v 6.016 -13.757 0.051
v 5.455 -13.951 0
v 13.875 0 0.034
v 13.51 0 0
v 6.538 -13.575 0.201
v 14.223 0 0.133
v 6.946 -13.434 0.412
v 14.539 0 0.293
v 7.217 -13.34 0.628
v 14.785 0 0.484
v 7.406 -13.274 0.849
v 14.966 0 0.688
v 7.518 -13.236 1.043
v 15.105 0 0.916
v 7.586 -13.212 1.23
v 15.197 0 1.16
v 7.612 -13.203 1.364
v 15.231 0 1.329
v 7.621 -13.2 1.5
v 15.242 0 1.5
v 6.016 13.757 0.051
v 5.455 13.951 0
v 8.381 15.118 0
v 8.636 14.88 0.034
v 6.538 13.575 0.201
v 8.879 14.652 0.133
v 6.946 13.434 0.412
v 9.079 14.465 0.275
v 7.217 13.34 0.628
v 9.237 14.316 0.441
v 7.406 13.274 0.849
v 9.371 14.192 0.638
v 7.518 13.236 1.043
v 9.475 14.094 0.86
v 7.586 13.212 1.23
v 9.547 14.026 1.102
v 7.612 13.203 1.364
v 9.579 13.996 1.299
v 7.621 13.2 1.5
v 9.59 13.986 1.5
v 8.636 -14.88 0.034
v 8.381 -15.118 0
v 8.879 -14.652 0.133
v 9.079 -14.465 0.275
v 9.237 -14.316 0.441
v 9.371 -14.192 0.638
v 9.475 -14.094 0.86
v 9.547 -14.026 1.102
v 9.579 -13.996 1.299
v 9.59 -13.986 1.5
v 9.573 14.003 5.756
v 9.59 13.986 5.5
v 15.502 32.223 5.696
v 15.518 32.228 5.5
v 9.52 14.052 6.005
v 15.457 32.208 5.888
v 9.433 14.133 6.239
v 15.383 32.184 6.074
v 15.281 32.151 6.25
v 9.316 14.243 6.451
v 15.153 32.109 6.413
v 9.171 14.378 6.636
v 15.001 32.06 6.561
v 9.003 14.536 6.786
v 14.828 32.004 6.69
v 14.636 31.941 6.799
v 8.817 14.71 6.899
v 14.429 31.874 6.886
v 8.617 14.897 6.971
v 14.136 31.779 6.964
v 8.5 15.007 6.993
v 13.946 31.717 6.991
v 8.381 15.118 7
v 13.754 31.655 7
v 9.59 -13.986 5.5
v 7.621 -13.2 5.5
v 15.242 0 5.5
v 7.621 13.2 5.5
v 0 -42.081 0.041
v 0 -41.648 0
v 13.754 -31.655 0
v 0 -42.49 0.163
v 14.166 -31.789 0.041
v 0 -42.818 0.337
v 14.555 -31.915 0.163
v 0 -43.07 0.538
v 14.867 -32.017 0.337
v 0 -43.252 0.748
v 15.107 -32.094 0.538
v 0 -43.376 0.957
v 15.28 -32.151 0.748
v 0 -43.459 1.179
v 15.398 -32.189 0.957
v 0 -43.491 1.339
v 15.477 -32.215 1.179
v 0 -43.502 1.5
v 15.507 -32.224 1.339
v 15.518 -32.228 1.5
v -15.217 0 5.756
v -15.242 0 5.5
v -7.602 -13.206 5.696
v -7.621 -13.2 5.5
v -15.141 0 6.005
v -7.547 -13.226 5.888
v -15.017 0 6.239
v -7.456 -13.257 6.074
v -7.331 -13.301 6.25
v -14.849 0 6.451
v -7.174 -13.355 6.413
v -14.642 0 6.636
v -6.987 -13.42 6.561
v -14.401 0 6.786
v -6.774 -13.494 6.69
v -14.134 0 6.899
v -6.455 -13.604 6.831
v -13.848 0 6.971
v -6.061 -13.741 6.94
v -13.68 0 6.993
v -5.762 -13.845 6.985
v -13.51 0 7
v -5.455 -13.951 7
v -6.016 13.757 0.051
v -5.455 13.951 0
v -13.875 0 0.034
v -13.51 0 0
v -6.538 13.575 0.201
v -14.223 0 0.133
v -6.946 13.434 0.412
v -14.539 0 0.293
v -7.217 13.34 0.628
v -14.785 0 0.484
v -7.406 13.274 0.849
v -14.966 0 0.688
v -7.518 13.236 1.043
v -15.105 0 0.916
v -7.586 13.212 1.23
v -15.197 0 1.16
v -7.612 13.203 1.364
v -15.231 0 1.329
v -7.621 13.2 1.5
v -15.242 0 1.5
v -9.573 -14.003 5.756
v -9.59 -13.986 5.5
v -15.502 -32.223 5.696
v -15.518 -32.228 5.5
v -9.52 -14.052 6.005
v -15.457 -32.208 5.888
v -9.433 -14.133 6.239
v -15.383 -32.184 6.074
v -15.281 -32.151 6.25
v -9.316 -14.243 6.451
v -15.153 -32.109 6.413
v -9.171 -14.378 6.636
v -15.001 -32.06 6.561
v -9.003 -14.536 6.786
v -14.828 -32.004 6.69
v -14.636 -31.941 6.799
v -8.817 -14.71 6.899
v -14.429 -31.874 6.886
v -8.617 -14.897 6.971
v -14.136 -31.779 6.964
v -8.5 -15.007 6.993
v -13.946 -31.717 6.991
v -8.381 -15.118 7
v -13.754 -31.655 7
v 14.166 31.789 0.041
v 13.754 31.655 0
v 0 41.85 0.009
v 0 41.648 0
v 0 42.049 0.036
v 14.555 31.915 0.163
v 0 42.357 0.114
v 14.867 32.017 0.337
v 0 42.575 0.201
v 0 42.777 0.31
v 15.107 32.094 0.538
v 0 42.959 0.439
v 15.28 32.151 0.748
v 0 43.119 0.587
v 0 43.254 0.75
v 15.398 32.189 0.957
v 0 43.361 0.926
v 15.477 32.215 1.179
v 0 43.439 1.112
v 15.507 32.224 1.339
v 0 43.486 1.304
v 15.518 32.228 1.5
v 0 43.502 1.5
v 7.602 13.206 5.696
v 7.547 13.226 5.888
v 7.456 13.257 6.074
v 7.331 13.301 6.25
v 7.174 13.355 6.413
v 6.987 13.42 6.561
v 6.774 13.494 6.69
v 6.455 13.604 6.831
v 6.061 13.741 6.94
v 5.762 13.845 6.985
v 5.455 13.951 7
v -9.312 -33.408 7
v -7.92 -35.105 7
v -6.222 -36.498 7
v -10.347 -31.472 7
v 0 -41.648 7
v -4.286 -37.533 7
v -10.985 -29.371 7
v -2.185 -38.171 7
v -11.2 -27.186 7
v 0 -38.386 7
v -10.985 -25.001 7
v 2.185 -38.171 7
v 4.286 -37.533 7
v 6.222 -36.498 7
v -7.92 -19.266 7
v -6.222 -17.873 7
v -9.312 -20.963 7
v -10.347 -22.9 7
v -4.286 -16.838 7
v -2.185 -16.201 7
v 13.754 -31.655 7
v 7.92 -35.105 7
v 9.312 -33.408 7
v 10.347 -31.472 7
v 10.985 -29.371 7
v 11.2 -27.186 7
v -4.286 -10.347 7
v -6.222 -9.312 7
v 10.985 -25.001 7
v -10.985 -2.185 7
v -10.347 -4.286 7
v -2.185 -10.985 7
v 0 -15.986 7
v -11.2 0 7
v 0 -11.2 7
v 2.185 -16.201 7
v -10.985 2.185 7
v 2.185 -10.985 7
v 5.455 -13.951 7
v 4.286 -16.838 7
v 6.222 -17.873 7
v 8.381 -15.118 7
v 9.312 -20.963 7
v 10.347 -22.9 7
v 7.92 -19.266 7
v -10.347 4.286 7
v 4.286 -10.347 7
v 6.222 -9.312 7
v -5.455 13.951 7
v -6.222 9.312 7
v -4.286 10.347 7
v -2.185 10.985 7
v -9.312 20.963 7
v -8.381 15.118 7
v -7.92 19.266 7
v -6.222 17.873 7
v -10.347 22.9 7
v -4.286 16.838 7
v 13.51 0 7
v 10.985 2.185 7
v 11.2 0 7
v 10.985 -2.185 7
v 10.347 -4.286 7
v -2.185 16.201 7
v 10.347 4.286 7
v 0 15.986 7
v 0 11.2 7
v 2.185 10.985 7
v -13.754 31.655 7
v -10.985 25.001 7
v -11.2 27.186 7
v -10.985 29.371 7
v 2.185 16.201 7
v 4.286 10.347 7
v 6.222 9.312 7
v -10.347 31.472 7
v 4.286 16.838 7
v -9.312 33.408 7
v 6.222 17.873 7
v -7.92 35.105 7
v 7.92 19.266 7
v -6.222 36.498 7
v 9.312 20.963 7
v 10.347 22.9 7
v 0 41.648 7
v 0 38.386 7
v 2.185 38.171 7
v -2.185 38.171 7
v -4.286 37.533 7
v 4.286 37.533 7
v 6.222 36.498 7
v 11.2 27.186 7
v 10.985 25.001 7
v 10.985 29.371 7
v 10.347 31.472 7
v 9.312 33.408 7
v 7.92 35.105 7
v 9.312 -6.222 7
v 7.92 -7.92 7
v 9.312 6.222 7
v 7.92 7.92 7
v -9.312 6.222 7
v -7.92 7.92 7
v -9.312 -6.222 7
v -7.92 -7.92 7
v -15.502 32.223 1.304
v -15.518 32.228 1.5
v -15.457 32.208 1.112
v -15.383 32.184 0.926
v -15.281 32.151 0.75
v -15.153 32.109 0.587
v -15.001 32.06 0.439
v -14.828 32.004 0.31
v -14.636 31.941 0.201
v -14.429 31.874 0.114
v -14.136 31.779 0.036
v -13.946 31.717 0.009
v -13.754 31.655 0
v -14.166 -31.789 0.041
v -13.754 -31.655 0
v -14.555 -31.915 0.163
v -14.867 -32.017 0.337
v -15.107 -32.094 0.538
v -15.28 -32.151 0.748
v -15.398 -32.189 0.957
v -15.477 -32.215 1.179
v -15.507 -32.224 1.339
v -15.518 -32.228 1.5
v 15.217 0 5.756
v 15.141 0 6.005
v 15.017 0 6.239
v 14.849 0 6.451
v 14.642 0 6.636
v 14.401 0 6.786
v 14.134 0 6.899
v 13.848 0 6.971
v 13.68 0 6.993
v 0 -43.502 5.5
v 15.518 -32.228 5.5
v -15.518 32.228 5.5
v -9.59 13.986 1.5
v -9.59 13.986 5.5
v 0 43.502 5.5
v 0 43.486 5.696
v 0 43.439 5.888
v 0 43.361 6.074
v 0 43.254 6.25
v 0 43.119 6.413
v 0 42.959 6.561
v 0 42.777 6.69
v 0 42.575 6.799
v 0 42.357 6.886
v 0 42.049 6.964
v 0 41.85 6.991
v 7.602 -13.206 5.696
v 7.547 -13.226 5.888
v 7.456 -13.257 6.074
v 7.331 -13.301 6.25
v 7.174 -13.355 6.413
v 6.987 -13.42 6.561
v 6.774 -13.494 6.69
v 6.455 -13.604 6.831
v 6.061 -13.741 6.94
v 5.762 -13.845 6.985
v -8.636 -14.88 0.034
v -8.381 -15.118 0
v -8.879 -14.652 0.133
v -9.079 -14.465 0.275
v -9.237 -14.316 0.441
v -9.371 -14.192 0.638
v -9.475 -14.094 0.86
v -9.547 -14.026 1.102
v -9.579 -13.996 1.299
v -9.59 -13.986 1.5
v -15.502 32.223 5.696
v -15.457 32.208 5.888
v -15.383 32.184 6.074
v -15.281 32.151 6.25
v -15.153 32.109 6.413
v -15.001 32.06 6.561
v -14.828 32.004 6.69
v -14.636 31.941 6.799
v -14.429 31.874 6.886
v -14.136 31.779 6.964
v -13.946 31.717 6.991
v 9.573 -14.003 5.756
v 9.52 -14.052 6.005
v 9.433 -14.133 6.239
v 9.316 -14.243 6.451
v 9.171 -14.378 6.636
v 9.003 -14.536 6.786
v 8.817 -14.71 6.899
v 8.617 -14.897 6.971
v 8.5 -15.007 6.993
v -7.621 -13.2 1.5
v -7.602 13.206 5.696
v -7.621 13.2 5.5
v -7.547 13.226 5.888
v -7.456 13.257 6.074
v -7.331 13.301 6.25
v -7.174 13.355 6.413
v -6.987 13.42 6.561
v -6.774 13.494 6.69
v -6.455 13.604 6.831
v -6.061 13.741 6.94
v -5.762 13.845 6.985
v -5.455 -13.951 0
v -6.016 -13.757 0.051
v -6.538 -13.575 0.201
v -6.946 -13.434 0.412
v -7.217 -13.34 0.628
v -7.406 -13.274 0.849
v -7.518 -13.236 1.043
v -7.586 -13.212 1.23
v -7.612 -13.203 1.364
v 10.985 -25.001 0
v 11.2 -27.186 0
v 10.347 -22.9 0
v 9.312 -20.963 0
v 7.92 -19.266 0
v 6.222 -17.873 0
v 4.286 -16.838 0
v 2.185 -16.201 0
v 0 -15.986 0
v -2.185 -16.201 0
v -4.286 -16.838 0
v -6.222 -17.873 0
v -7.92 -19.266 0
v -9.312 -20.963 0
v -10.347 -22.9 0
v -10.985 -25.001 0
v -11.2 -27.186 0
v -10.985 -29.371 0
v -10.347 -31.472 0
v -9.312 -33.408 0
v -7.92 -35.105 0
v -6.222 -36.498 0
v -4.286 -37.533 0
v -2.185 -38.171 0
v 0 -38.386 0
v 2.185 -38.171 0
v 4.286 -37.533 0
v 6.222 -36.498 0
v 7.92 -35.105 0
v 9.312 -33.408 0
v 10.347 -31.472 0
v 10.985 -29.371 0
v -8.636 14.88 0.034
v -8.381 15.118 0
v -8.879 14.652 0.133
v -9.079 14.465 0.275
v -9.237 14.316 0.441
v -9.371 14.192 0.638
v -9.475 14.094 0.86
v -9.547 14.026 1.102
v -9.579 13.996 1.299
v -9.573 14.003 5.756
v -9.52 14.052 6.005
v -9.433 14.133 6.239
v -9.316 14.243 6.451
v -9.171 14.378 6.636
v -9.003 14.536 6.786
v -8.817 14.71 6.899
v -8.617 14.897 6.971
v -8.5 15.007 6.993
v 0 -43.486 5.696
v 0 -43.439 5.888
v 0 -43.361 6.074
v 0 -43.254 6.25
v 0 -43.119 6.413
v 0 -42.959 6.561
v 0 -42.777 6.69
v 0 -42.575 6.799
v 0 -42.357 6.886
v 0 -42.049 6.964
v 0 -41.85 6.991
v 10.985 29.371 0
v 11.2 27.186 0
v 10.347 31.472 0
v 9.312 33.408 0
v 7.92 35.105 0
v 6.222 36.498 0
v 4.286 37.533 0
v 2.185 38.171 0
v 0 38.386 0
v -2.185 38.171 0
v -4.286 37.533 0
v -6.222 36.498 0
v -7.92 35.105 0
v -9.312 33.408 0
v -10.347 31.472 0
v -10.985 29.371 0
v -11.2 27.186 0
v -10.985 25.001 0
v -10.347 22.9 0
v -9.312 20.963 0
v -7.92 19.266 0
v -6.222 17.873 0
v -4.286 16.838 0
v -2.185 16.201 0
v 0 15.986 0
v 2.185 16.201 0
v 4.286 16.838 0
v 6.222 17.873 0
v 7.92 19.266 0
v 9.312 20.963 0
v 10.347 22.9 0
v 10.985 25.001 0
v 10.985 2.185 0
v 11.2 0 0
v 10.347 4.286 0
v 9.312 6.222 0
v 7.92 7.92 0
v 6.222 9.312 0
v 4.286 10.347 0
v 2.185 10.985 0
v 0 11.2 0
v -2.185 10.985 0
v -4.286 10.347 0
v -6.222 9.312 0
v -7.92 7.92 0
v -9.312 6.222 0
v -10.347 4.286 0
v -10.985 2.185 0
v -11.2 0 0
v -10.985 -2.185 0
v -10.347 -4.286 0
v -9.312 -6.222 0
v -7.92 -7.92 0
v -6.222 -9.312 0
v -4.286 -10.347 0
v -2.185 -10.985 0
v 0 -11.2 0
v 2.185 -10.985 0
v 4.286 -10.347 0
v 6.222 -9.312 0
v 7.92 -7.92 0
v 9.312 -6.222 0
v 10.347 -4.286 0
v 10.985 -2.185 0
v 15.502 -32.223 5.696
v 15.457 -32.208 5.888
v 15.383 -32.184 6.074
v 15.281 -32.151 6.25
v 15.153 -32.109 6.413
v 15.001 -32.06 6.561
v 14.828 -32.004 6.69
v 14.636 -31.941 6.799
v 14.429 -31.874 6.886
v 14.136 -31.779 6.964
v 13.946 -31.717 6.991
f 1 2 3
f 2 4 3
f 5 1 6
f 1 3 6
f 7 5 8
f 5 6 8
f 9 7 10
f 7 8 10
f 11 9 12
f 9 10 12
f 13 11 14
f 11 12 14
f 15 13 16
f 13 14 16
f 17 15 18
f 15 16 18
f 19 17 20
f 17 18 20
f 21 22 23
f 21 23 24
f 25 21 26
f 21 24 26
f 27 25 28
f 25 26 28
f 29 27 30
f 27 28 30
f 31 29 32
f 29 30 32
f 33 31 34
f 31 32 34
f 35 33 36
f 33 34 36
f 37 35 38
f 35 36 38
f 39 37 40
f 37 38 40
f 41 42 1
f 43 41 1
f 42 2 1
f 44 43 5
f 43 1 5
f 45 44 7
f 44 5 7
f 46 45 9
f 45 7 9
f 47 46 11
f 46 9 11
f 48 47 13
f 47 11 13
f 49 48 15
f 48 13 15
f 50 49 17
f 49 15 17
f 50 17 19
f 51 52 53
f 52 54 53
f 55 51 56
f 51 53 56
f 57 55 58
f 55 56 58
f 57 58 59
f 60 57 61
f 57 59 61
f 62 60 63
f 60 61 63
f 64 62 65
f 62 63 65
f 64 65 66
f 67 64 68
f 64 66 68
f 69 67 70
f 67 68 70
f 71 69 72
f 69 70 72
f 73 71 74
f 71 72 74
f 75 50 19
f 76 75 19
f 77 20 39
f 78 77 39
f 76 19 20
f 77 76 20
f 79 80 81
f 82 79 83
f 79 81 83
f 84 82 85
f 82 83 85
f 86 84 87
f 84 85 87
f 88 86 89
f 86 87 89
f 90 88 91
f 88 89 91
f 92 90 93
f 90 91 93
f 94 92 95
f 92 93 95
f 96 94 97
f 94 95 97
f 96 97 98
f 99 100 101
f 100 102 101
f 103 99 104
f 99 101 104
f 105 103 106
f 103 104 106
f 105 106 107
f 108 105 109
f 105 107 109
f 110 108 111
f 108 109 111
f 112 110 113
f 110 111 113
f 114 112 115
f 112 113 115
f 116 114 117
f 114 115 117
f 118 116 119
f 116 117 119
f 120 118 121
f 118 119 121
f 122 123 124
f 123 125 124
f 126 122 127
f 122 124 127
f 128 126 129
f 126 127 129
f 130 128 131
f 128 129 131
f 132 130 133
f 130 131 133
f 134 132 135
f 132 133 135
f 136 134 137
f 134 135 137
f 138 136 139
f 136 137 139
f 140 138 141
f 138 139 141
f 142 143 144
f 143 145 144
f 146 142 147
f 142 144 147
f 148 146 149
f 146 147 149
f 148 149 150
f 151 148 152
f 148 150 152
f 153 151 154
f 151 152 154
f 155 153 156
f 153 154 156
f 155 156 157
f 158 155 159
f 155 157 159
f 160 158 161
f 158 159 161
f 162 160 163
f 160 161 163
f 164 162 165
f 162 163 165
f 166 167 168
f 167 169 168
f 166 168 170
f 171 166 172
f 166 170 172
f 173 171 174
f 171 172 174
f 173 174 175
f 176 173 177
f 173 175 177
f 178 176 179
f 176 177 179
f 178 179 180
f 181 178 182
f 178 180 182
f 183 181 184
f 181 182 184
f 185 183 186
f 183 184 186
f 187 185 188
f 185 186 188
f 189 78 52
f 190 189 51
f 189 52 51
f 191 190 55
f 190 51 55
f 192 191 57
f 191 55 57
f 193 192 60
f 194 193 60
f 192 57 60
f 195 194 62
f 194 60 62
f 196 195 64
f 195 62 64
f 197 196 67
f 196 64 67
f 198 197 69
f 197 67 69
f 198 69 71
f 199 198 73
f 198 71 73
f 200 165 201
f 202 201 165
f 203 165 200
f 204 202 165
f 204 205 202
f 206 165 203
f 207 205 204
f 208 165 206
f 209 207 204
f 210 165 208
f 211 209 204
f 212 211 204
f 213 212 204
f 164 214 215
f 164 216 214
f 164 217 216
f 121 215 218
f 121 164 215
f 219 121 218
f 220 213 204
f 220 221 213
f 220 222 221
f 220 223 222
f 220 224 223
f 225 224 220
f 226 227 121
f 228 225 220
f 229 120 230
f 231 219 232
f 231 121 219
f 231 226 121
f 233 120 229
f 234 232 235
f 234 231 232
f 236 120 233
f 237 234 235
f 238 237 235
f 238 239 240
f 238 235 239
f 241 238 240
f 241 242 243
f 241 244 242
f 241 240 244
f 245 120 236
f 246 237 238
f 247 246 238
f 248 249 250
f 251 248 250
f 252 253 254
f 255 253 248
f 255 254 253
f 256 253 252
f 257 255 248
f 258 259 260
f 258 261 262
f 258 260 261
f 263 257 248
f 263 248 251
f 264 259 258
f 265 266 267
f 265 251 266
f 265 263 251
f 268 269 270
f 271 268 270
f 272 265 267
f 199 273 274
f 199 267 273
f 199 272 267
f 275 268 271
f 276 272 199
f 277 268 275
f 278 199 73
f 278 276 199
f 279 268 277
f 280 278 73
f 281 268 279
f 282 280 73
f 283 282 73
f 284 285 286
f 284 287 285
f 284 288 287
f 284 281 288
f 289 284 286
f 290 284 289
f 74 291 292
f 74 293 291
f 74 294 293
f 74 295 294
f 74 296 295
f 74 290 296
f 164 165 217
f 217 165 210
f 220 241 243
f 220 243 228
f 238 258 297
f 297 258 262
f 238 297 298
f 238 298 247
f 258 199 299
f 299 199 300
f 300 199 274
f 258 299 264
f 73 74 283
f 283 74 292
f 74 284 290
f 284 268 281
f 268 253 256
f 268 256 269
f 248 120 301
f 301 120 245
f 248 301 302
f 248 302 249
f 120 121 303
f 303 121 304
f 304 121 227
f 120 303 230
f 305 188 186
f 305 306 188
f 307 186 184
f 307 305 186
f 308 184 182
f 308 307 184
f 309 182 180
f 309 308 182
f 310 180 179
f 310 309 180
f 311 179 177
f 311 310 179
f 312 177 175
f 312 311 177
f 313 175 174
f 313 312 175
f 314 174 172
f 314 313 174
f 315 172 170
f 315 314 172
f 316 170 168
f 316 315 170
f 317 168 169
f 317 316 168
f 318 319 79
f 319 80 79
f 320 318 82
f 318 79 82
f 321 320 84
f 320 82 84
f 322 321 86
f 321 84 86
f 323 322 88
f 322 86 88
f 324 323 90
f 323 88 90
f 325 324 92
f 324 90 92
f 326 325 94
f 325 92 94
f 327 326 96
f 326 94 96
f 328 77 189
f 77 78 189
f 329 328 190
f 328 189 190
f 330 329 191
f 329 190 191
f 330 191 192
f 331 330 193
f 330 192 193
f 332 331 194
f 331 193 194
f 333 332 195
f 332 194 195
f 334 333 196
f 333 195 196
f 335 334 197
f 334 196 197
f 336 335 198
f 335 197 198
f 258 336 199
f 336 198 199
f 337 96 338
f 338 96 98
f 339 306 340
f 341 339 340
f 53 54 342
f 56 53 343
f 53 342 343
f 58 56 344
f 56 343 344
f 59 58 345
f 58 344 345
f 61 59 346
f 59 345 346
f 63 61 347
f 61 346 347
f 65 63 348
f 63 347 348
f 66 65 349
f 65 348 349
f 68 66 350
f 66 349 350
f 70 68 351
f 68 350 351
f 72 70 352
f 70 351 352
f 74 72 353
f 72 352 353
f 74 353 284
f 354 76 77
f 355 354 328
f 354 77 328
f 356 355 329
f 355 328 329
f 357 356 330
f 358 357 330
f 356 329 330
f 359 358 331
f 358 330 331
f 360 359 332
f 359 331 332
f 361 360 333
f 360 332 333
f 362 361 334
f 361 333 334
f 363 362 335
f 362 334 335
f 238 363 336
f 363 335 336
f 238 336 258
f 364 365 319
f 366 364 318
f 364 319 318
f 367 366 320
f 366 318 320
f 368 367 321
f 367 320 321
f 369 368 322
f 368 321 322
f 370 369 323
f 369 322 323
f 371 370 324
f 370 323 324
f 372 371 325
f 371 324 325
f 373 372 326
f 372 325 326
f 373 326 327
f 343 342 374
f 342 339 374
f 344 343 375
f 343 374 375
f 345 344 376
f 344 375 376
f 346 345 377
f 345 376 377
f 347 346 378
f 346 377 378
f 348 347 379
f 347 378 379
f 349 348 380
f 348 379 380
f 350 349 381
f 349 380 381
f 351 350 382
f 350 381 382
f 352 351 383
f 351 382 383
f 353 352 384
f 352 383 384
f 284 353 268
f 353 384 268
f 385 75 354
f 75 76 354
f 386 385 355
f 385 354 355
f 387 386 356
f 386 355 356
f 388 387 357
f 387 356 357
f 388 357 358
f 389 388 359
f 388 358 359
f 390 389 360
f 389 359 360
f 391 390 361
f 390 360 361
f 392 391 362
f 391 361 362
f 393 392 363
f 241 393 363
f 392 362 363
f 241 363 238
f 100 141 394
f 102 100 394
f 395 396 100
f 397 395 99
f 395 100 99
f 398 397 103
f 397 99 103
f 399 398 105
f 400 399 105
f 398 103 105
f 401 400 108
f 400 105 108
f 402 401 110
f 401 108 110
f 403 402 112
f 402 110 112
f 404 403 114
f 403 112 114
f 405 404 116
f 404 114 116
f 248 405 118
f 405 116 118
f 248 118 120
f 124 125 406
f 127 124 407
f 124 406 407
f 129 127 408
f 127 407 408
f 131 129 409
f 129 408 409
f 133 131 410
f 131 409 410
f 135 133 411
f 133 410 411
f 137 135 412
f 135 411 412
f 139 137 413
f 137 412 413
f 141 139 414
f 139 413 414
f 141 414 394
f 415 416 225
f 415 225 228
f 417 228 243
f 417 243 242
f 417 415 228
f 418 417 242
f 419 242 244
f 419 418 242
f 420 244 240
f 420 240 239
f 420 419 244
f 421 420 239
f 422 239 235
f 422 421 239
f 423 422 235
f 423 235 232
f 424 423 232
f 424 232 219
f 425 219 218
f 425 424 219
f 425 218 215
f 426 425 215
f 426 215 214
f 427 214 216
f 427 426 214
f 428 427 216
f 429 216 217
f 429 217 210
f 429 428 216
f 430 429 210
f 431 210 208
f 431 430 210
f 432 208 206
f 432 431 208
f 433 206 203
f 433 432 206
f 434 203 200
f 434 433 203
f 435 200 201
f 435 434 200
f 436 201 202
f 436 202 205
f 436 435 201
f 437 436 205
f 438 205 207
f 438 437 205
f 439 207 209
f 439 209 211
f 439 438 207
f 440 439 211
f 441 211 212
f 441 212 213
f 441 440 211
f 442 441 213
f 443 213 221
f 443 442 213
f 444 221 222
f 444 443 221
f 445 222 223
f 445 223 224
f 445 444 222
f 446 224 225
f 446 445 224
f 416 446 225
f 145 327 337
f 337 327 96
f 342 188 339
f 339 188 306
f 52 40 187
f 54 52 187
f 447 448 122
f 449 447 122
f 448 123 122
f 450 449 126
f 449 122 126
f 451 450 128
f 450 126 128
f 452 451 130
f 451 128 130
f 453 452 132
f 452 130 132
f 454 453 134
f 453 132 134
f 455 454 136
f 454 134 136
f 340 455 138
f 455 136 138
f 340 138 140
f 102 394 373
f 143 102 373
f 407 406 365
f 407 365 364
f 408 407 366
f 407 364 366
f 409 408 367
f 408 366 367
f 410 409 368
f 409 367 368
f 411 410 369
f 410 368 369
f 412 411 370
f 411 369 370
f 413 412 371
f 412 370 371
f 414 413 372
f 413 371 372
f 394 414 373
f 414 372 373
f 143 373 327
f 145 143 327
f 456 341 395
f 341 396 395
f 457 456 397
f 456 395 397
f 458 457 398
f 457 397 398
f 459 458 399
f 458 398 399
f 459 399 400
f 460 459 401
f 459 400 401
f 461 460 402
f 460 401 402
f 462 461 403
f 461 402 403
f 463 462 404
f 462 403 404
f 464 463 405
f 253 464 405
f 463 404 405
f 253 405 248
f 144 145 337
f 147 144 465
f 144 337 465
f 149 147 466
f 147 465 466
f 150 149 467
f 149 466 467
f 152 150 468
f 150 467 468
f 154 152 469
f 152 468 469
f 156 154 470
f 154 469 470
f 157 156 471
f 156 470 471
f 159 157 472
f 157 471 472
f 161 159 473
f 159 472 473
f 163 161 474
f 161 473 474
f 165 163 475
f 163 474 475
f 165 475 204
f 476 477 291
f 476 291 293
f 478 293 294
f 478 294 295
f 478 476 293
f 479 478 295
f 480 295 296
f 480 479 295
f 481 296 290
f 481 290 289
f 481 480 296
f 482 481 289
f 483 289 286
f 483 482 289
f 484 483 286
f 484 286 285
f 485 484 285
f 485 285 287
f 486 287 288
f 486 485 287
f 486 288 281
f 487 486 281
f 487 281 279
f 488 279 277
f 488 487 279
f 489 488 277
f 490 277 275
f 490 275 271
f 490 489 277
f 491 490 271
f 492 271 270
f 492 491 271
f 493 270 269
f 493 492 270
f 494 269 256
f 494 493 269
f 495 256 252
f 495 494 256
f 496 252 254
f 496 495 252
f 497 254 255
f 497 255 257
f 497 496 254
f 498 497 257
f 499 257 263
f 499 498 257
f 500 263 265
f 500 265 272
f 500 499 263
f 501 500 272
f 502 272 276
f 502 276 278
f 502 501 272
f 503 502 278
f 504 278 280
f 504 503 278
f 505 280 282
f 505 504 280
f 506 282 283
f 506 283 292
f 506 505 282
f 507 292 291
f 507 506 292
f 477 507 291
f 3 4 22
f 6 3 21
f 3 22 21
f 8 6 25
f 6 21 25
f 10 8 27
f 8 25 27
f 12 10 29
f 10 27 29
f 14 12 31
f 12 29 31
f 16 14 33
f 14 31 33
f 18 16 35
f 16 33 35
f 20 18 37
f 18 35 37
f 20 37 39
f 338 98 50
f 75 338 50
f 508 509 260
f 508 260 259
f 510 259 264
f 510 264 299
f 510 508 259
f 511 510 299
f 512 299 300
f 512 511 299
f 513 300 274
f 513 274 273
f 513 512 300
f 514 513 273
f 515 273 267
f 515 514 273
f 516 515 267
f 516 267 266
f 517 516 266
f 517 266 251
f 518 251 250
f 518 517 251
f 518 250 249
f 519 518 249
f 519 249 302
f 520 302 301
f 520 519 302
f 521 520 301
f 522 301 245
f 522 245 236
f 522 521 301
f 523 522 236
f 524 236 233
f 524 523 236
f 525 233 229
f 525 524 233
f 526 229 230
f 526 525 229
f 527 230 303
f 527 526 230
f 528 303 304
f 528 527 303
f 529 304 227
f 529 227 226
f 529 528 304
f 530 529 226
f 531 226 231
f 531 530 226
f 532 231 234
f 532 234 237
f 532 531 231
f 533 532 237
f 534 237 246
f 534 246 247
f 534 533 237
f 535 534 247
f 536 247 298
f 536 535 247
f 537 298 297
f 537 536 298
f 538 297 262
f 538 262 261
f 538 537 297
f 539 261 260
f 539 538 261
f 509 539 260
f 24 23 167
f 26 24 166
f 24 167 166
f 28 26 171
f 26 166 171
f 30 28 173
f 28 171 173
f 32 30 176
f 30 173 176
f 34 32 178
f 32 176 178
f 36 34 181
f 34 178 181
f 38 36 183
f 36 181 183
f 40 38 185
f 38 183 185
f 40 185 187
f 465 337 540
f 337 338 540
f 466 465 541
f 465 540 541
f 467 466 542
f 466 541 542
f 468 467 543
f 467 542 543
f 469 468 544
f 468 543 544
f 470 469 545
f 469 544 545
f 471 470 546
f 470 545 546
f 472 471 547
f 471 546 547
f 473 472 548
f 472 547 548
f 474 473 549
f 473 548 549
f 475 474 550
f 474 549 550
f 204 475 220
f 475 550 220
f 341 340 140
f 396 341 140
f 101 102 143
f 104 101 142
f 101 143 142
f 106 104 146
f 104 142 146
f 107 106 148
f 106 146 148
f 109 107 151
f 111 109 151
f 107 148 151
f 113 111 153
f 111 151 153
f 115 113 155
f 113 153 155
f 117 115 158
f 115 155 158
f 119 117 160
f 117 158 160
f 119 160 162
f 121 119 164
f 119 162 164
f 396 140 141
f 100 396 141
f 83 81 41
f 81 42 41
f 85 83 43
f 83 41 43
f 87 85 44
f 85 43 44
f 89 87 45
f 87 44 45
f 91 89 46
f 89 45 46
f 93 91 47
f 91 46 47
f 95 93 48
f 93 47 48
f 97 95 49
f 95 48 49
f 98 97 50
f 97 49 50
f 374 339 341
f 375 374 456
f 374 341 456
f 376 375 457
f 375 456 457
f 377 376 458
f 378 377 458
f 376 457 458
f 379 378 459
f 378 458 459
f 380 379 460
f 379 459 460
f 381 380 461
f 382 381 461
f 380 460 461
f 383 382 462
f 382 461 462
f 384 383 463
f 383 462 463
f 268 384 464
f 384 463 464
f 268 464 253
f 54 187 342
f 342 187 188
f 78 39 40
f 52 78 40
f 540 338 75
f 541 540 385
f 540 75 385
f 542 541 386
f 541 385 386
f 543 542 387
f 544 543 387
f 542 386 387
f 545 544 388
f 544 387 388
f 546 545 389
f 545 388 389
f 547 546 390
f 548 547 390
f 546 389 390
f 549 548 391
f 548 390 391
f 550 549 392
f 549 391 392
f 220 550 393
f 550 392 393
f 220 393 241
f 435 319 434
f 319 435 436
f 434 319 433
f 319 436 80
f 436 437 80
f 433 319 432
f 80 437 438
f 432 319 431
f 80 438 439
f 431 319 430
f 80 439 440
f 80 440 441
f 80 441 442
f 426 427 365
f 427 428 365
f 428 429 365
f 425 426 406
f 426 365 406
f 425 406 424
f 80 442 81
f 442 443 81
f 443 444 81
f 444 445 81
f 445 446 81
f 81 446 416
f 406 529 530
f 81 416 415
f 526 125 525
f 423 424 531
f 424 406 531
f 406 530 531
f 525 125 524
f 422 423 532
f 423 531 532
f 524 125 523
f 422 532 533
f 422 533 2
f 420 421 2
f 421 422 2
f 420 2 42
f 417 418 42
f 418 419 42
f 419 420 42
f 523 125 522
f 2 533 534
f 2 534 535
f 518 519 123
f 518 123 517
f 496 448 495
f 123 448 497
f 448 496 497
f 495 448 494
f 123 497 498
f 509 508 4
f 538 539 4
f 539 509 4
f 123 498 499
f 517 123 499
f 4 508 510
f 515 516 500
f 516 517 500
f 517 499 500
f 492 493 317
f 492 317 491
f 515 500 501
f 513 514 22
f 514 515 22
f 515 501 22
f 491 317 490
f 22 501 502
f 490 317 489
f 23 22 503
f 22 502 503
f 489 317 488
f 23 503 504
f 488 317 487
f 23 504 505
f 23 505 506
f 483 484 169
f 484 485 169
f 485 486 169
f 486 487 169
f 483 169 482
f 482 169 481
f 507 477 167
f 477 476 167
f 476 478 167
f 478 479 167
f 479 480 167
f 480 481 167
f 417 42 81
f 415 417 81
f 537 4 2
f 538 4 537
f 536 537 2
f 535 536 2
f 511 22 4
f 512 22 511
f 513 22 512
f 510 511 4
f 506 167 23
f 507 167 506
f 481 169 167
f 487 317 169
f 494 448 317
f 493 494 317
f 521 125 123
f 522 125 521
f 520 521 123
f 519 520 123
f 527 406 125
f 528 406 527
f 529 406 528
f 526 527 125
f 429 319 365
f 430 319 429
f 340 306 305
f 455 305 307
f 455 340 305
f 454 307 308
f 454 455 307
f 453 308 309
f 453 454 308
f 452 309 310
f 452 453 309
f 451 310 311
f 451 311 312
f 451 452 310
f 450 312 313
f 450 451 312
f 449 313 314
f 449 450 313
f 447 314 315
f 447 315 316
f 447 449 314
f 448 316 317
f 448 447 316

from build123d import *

# Parameters (mm, degrees)
F0_R     = 11.2
F1_DEPTH = 7
F2_R     = 1.5
F3_R     = 1.5


with BuildPart() as f1:
    # F0 (on Top) → F1 (new body)
    with BuildSketch(Plane.XY):
        Polygon((-15.517531, 32.227794), (-9.590361, 13.985842), (-7.621024, 13.2), (-15.242047, 0), (-7.621024, -13.2), (-9.590361, -13.985842), (-15.517531, -32.227794), (0, -43.50194), (15.517531, -32.227794), (9.590361, -13.985842), (7.621024, -13.2), (15.242047, 0), (7.621024, 13.2), (9.590361, 13.985842), (15.517531, 32.227794), (0, 43.50194), align=None)
        with Locations((0, -27.185842)):
            Circle(F0_R, mode=Mode.SUBTRACT)
        Circle(F0_R, mode=Mode.SUBTRACT)
        with Locations((0, 27.185842)):
            Circle(F0_R, mode=Mode.SUBTRACT)
    extrude(amount=F1_DEPTH)

    # F2
    f2_edges = [f1.edges().sort_by_distance(p)[0] for p in [
        (-12.553946, -23.106818, 7),
        (-7.758765, -37.864867, 7),
        (7.758765, -37.864867, 7),
        (12.553946, -23.106818, 7),
        (-8.605692, -13.592921, 7),
        (8.605692, -13.592921, 7),
        (8.605692, 13.592921, 7),
        (-8.605692, 13.592921, 7),
        (-11.431535, 6.6, 7),
        (-11.431535, -6.6, 7),
        (11.431535, -6.6, 7),
        (11.431535, 6.6, 7),
        (12.553946, 23.106818, 7),
        (7.758765, 37.864867, 7),
        (-7.758765, 37.864867, 7),
        (-12.553946, 23.106818, 7),
    ]]
    fillet(f2_edges, radius=F2_R)

    # F3
    f3_edges = [f1.edges().sort_by_distance(p)[0] for p in [
        (-7.758765, -37.864867, 0),
        (-12.553946, -23.106818, 0),
        (12.553946, -23.106818, 0),
        (7.758765, -37.864867, 0),
        (-8.605692, -13.592921, 0),
        (-8.605692, 13.592921, 0),
        (8.605692, 13.592921, 0),
        (8.605692, -13.592921, 0),
        (11.431535, -6.6, 0),
        (-12.553946, 23.106818, 0),
        (-7.758765, 37.864867, 0),
        (7.758765, 37.864867, 0),
        (12.553946, 23.106818, 0),
        (-11.431535, 6.6, 0),
        (-11.431535, -6.6, 0),
        (11.431535, 6.6, 0),
    ]]
    fillet(f3_edges, radius=F3_R)


solid = f1.part
